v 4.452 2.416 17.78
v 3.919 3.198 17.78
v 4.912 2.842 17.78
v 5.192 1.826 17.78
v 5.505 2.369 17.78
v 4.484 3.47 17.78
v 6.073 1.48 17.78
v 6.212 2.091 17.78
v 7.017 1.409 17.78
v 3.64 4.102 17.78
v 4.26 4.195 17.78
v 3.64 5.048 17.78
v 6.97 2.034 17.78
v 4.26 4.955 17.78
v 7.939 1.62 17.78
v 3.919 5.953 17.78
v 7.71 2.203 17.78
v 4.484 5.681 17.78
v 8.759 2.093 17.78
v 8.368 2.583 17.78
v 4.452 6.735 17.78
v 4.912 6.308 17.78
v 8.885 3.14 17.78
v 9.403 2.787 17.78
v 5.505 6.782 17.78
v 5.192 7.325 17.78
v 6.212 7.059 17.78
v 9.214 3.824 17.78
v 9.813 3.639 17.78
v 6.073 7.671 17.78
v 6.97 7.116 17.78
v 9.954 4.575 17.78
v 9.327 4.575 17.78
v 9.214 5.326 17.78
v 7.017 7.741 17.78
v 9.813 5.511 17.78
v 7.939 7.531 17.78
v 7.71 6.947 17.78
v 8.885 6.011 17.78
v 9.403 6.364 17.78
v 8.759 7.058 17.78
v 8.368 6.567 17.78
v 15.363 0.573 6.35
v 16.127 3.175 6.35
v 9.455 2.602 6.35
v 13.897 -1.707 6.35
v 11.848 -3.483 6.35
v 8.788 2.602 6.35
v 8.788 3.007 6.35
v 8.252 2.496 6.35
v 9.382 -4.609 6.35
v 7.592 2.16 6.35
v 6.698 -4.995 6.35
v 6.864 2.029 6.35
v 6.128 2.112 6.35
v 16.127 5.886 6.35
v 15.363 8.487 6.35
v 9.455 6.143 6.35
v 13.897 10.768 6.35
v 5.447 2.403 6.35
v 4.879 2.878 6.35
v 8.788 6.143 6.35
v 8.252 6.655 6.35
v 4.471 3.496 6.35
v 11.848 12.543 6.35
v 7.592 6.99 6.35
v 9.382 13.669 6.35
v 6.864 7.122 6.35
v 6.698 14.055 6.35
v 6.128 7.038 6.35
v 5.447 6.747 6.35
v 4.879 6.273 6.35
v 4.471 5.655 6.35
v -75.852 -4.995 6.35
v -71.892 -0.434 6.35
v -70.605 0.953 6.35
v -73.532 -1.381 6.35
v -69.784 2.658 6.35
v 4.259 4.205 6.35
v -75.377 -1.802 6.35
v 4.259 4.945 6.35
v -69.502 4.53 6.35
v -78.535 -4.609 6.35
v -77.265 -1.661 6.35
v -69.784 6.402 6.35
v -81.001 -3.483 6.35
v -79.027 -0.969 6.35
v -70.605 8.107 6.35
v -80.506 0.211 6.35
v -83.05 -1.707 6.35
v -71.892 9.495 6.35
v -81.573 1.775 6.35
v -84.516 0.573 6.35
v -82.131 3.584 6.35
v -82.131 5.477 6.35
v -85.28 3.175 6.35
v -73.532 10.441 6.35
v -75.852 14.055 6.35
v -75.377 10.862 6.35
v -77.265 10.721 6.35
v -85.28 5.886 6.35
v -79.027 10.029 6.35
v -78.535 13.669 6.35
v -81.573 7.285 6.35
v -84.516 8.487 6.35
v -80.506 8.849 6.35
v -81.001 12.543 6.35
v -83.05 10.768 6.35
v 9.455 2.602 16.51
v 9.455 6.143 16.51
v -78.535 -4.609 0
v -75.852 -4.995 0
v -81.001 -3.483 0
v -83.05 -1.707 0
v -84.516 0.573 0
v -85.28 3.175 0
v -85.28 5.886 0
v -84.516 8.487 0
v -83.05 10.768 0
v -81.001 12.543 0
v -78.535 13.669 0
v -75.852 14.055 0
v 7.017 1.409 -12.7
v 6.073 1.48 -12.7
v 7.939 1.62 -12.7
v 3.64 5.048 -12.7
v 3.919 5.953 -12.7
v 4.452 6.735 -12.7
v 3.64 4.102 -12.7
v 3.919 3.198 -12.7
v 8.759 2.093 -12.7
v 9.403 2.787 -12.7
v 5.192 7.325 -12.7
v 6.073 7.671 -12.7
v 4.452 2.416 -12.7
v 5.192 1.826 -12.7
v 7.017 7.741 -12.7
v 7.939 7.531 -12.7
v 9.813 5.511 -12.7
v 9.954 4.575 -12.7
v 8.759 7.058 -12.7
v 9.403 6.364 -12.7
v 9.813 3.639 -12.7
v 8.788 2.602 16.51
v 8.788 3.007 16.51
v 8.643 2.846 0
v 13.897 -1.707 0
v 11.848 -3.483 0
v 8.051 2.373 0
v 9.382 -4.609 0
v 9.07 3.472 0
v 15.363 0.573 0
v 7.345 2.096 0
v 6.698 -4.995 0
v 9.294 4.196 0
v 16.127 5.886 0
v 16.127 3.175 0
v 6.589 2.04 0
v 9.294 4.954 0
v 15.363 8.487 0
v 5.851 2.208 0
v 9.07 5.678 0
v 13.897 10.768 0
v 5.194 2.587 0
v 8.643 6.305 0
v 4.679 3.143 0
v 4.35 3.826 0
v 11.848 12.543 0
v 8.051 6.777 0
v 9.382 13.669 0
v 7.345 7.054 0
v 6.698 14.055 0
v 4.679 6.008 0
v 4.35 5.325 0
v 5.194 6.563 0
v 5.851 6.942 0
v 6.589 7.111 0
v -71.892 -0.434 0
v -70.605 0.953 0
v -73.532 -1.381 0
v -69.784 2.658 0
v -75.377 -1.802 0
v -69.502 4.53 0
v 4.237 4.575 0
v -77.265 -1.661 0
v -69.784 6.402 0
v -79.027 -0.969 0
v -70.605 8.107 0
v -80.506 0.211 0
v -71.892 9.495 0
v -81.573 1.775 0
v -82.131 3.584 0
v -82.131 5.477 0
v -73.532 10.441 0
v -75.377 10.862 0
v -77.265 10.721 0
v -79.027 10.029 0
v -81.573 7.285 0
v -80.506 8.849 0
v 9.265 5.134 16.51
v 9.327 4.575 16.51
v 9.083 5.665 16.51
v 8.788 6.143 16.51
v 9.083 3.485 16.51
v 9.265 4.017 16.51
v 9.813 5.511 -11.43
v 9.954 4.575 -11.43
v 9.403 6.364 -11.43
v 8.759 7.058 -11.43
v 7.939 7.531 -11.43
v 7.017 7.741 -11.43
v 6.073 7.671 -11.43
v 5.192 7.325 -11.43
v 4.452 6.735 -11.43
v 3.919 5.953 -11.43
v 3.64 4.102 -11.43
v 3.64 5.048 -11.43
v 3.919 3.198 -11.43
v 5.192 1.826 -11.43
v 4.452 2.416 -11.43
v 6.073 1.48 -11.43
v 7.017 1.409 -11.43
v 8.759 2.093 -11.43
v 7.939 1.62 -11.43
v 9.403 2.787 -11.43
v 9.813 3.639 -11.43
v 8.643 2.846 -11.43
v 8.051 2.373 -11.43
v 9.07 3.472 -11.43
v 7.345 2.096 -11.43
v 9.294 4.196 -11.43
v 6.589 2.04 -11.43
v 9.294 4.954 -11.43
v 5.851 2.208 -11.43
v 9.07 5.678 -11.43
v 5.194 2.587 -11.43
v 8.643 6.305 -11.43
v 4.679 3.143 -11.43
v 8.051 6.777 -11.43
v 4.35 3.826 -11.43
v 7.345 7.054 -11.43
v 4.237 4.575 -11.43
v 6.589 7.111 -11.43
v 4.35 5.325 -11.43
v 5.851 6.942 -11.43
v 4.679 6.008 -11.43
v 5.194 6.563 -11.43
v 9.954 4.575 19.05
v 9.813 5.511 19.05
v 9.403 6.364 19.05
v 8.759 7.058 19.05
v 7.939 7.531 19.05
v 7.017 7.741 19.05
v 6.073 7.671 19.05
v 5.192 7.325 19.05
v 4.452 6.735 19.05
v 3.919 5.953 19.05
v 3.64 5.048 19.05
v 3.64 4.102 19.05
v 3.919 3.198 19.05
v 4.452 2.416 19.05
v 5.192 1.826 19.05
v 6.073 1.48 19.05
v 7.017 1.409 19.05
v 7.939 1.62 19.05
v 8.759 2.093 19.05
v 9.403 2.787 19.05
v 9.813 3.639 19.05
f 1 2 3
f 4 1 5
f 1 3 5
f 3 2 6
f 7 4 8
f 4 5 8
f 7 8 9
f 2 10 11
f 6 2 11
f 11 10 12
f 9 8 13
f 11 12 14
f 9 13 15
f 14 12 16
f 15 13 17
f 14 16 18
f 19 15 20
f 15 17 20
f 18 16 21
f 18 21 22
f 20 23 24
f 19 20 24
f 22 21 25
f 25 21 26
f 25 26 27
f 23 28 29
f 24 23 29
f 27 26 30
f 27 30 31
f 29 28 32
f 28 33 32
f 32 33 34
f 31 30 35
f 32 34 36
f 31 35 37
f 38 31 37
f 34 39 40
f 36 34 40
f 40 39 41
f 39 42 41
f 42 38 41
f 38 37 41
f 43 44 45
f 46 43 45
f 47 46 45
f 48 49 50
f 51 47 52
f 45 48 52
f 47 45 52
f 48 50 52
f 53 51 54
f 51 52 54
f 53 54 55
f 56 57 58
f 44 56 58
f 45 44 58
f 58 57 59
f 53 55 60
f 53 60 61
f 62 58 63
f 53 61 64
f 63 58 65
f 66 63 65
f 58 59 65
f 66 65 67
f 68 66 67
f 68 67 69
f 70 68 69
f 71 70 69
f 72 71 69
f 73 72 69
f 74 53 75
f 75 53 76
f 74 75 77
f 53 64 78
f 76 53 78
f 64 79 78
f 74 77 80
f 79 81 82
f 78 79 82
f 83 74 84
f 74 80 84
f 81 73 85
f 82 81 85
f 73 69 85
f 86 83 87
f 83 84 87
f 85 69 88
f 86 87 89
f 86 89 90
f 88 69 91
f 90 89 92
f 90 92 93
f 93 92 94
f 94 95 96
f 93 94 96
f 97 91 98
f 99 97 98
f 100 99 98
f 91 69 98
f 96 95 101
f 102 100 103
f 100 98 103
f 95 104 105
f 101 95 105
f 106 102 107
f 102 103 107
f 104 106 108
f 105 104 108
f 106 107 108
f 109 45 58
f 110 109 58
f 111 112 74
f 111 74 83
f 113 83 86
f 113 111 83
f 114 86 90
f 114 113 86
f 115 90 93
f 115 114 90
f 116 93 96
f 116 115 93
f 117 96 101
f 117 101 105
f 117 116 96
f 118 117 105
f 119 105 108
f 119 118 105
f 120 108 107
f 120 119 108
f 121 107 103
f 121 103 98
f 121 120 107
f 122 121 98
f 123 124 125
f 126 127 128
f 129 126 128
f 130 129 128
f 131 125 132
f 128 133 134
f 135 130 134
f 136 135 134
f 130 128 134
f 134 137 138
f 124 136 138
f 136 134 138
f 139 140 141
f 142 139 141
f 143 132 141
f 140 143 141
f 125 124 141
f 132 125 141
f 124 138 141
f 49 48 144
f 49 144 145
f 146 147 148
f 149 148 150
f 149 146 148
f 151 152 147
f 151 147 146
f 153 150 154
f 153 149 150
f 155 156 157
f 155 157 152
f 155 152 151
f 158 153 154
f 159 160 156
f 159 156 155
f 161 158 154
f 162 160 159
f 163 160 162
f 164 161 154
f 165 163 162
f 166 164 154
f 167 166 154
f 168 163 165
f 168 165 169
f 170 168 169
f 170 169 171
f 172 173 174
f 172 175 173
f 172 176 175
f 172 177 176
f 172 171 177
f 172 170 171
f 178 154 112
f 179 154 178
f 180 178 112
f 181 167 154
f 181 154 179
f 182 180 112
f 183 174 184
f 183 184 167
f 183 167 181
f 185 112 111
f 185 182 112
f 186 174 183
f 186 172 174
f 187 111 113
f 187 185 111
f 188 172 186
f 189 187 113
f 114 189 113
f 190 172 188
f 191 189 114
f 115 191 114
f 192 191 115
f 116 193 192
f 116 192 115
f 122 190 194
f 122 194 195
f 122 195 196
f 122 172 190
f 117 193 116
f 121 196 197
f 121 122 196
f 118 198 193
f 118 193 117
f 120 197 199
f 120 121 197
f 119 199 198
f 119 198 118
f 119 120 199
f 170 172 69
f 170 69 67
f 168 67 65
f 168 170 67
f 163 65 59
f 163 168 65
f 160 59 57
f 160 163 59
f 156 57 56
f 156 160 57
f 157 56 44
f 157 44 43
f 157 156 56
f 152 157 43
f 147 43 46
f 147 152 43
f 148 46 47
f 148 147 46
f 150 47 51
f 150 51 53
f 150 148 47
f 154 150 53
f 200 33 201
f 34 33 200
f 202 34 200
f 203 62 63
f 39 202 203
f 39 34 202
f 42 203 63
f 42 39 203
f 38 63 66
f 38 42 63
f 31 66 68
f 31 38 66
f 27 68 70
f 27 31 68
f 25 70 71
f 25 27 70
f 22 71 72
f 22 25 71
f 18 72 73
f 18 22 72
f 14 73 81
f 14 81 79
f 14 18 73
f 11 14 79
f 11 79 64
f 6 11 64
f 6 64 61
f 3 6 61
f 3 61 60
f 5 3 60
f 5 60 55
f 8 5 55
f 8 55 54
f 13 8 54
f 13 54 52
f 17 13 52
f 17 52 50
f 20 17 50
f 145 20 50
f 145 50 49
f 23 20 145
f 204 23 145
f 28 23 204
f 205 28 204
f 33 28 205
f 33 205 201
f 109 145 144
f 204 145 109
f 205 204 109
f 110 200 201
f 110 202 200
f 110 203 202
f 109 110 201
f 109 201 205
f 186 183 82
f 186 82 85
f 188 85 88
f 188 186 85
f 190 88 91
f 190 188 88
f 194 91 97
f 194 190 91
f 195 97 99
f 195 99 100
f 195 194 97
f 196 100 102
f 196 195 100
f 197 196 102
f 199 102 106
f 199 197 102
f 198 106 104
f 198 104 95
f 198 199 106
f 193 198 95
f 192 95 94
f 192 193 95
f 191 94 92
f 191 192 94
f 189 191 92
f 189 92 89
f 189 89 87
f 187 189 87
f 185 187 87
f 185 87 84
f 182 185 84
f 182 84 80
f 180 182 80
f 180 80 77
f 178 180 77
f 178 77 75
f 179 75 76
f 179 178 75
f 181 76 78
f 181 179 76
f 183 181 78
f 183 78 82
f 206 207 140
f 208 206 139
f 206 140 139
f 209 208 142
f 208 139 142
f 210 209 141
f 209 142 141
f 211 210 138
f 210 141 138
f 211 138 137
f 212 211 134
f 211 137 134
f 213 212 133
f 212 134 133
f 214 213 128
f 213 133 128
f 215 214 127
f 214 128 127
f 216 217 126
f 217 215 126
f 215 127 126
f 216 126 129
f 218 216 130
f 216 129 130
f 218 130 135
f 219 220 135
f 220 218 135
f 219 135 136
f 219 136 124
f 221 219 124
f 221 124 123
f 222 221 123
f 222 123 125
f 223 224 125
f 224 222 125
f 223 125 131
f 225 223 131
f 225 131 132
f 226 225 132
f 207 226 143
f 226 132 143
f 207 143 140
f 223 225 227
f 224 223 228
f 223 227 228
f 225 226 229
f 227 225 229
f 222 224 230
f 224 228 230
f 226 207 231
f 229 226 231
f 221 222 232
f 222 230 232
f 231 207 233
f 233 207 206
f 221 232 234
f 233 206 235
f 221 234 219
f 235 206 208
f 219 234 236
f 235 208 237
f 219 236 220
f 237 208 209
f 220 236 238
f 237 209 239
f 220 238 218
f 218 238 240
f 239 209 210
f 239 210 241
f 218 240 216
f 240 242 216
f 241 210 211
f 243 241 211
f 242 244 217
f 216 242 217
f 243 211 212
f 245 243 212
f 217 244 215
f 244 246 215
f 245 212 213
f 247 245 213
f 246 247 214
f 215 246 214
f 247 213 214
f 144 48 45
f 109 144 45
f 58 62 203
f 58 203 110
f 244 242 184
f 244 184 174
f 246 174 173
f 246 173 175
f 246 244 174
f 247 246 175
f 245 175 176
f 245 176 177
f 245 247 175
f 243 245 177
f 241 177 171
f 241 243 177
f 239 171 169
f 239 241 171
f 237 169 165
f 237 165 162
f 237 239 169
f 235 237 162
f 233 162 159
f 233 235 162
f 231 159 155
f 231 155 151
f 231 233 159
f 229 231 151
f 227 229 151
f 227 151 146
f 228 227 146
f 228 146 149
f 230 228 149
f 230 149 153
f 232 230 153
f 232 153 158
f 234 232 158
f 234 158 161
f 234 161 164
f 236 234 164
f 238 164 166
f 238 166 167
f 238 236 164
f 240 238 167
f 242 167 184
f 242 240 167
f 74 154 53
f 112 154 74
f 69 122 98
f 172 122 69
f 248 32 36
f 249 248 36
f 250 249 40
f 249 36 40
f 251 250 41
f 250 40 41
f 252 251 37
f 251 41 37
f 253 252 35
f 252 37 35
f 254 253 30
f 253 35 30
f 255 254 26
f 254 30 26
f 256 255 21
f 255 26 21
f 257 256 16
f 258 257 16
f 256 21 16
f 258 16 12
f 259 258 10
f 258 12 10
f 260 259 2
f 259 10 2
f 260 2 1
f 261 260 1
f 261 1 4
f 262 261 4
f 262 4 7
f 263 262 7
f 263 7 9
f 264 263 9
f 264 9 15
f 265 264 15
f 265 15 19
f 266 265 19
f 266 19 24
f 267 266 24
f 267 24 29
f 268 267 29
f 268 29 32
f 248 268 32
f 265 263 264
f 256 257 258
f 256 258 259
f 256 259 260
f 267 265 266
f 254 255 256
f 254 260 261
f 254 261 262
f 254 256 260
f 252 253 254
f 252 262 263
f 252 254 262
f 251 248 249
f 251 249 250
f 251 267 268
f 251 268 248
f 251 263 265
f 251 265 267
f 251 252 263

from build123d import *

# Parameters (mm, degrees)
SKETCH1_R                = 6.35
BOSS_EXTRUDE1_DEPTH      = 6.35
BOSS_EXTRUDE2_DEPTH      = 12.7
BOSS_EXTRUDE2_DEPTH_BACK = 19.05
SKETCH2_R                = 3.175
CUT_EXTRUDE1_START       = -1.27
SKETCH9_OUTSIDE_W        = 125.228
SKETCH9_OUTSIDE_H        = 42.678
SKETCH9_OUTSIDE_R        = 2.547934527
CUT_EXTRUDE1_DEPTH       = 11.43
CUT_EXTRUDE2_START       = -1.27
SKETCH10_OUTSIDE_W       = 125.228
SKETCH10_OUTSIDE_H       = 42.678
SKETCH10_OUTSIDE_R       = 2.542549773
CUT_EXTRUDE2_DEPTH       = 11.43
SKETCH11_W               = 0.667064712
SKETCH11_H               = 3.541255891
BOSS_EXTRUDE3_DEPTH      = 10.16


with BuildPart() as part:
    # Sketch1 → Boss-Extrude1 (new body)
    with BuildSketch(Plane.XY):
        with BuildLine():
            Line((-75.85152439, 14.055182927), (6.69847561, 14.055182927))
            ThreePointArc((6.69847561, 14.055182927), (16.22347561, 4.530182927), (6.69847561, -4.994817073))
            Line((6.69847561, -4.994817073), (-75.85152439, -4.994817073))
            ThreePointArc((-75.85152439, -4.994817073), (-85.37652439, 4.530182927), (-75.85152439, 14.055182927))
        make_face()
        with Locations((-75.85152439, 4.530182927)):
            Circle(SKETCH1_R, mode=Mode.SUBTRACT)
    extrude(amount=BOSS_EXTRUDE1_DEPTH)

    # Sketch2 → Boss-Extrude2 (add, two sides: drawn at the far end of the back side and taken through both)
    with BuildSketch(Plane.XY.offset(6.35).offset(-BOSS_EXTRUDE2_DEPTH_BACK)):
        with Locations((6.779432591, 4.575242679)):
            Circle(SKETCH2_R)
    extrude(amount=BOSS_EXTRUDE2_DEPTH + BOSS_EXTRUDE2_DEPTH_BACK)

    # Sketch9 outside → Cut-Extrude1 (cut)
    with BuildSketch(Plane.XY.offset(19.05).offset(CUT_EXTRUDE1_START)):
        with Locations((-34.577, 4.53)):
            Rectangle(SKETCH9_OUTSIDE_W, SKETCH9_OUTSIDE_H)
        with Locations((6.779432591, 4.575242679)):
            Circle(SKETCH9_OUTSIDE_R, mode=Mode.SUBTRACT)
    extrude(amount=-CUT_EXTRUDE1_DEPTH, mode=Mode.SUBTRACT)

    # Sketch10 outside → Cut-Extrude2 (cut)
    with BuildSketch(Plane(origin=(0, 0, -12.7), x_dir=(-1, 0, 0), z_dir=(0, 0, -1)).offset(CUT_EXTRUDE2_START)):
        with Locations((34.577, 4.53)):
            Rectangle(SKETCH10_OUTSIDE_W, SKETCH10_OUTSIDE_H)
        with Locations((-6.779432591, 4.575242679)):
            Circle(SKETCH10_OUTSIDE_R, mode=Mode.SUBTRACT)
    extrude(amount=-CUT_EXTRUDE2_DEPTH, mode=Mode.SUBTRACT)

    # Sketch11 → Boss-Extrude3 (add)
    with BuildSketch(Plane.XY.offset(6.35)):
        with Locations((9.121178525, 4.372750116)):
            Rectangle(SKETCH11_W, SKETCH11_H)
    extrude(amount=BOSS_EXTRUDE3_DEPTH)


solid = part.part
